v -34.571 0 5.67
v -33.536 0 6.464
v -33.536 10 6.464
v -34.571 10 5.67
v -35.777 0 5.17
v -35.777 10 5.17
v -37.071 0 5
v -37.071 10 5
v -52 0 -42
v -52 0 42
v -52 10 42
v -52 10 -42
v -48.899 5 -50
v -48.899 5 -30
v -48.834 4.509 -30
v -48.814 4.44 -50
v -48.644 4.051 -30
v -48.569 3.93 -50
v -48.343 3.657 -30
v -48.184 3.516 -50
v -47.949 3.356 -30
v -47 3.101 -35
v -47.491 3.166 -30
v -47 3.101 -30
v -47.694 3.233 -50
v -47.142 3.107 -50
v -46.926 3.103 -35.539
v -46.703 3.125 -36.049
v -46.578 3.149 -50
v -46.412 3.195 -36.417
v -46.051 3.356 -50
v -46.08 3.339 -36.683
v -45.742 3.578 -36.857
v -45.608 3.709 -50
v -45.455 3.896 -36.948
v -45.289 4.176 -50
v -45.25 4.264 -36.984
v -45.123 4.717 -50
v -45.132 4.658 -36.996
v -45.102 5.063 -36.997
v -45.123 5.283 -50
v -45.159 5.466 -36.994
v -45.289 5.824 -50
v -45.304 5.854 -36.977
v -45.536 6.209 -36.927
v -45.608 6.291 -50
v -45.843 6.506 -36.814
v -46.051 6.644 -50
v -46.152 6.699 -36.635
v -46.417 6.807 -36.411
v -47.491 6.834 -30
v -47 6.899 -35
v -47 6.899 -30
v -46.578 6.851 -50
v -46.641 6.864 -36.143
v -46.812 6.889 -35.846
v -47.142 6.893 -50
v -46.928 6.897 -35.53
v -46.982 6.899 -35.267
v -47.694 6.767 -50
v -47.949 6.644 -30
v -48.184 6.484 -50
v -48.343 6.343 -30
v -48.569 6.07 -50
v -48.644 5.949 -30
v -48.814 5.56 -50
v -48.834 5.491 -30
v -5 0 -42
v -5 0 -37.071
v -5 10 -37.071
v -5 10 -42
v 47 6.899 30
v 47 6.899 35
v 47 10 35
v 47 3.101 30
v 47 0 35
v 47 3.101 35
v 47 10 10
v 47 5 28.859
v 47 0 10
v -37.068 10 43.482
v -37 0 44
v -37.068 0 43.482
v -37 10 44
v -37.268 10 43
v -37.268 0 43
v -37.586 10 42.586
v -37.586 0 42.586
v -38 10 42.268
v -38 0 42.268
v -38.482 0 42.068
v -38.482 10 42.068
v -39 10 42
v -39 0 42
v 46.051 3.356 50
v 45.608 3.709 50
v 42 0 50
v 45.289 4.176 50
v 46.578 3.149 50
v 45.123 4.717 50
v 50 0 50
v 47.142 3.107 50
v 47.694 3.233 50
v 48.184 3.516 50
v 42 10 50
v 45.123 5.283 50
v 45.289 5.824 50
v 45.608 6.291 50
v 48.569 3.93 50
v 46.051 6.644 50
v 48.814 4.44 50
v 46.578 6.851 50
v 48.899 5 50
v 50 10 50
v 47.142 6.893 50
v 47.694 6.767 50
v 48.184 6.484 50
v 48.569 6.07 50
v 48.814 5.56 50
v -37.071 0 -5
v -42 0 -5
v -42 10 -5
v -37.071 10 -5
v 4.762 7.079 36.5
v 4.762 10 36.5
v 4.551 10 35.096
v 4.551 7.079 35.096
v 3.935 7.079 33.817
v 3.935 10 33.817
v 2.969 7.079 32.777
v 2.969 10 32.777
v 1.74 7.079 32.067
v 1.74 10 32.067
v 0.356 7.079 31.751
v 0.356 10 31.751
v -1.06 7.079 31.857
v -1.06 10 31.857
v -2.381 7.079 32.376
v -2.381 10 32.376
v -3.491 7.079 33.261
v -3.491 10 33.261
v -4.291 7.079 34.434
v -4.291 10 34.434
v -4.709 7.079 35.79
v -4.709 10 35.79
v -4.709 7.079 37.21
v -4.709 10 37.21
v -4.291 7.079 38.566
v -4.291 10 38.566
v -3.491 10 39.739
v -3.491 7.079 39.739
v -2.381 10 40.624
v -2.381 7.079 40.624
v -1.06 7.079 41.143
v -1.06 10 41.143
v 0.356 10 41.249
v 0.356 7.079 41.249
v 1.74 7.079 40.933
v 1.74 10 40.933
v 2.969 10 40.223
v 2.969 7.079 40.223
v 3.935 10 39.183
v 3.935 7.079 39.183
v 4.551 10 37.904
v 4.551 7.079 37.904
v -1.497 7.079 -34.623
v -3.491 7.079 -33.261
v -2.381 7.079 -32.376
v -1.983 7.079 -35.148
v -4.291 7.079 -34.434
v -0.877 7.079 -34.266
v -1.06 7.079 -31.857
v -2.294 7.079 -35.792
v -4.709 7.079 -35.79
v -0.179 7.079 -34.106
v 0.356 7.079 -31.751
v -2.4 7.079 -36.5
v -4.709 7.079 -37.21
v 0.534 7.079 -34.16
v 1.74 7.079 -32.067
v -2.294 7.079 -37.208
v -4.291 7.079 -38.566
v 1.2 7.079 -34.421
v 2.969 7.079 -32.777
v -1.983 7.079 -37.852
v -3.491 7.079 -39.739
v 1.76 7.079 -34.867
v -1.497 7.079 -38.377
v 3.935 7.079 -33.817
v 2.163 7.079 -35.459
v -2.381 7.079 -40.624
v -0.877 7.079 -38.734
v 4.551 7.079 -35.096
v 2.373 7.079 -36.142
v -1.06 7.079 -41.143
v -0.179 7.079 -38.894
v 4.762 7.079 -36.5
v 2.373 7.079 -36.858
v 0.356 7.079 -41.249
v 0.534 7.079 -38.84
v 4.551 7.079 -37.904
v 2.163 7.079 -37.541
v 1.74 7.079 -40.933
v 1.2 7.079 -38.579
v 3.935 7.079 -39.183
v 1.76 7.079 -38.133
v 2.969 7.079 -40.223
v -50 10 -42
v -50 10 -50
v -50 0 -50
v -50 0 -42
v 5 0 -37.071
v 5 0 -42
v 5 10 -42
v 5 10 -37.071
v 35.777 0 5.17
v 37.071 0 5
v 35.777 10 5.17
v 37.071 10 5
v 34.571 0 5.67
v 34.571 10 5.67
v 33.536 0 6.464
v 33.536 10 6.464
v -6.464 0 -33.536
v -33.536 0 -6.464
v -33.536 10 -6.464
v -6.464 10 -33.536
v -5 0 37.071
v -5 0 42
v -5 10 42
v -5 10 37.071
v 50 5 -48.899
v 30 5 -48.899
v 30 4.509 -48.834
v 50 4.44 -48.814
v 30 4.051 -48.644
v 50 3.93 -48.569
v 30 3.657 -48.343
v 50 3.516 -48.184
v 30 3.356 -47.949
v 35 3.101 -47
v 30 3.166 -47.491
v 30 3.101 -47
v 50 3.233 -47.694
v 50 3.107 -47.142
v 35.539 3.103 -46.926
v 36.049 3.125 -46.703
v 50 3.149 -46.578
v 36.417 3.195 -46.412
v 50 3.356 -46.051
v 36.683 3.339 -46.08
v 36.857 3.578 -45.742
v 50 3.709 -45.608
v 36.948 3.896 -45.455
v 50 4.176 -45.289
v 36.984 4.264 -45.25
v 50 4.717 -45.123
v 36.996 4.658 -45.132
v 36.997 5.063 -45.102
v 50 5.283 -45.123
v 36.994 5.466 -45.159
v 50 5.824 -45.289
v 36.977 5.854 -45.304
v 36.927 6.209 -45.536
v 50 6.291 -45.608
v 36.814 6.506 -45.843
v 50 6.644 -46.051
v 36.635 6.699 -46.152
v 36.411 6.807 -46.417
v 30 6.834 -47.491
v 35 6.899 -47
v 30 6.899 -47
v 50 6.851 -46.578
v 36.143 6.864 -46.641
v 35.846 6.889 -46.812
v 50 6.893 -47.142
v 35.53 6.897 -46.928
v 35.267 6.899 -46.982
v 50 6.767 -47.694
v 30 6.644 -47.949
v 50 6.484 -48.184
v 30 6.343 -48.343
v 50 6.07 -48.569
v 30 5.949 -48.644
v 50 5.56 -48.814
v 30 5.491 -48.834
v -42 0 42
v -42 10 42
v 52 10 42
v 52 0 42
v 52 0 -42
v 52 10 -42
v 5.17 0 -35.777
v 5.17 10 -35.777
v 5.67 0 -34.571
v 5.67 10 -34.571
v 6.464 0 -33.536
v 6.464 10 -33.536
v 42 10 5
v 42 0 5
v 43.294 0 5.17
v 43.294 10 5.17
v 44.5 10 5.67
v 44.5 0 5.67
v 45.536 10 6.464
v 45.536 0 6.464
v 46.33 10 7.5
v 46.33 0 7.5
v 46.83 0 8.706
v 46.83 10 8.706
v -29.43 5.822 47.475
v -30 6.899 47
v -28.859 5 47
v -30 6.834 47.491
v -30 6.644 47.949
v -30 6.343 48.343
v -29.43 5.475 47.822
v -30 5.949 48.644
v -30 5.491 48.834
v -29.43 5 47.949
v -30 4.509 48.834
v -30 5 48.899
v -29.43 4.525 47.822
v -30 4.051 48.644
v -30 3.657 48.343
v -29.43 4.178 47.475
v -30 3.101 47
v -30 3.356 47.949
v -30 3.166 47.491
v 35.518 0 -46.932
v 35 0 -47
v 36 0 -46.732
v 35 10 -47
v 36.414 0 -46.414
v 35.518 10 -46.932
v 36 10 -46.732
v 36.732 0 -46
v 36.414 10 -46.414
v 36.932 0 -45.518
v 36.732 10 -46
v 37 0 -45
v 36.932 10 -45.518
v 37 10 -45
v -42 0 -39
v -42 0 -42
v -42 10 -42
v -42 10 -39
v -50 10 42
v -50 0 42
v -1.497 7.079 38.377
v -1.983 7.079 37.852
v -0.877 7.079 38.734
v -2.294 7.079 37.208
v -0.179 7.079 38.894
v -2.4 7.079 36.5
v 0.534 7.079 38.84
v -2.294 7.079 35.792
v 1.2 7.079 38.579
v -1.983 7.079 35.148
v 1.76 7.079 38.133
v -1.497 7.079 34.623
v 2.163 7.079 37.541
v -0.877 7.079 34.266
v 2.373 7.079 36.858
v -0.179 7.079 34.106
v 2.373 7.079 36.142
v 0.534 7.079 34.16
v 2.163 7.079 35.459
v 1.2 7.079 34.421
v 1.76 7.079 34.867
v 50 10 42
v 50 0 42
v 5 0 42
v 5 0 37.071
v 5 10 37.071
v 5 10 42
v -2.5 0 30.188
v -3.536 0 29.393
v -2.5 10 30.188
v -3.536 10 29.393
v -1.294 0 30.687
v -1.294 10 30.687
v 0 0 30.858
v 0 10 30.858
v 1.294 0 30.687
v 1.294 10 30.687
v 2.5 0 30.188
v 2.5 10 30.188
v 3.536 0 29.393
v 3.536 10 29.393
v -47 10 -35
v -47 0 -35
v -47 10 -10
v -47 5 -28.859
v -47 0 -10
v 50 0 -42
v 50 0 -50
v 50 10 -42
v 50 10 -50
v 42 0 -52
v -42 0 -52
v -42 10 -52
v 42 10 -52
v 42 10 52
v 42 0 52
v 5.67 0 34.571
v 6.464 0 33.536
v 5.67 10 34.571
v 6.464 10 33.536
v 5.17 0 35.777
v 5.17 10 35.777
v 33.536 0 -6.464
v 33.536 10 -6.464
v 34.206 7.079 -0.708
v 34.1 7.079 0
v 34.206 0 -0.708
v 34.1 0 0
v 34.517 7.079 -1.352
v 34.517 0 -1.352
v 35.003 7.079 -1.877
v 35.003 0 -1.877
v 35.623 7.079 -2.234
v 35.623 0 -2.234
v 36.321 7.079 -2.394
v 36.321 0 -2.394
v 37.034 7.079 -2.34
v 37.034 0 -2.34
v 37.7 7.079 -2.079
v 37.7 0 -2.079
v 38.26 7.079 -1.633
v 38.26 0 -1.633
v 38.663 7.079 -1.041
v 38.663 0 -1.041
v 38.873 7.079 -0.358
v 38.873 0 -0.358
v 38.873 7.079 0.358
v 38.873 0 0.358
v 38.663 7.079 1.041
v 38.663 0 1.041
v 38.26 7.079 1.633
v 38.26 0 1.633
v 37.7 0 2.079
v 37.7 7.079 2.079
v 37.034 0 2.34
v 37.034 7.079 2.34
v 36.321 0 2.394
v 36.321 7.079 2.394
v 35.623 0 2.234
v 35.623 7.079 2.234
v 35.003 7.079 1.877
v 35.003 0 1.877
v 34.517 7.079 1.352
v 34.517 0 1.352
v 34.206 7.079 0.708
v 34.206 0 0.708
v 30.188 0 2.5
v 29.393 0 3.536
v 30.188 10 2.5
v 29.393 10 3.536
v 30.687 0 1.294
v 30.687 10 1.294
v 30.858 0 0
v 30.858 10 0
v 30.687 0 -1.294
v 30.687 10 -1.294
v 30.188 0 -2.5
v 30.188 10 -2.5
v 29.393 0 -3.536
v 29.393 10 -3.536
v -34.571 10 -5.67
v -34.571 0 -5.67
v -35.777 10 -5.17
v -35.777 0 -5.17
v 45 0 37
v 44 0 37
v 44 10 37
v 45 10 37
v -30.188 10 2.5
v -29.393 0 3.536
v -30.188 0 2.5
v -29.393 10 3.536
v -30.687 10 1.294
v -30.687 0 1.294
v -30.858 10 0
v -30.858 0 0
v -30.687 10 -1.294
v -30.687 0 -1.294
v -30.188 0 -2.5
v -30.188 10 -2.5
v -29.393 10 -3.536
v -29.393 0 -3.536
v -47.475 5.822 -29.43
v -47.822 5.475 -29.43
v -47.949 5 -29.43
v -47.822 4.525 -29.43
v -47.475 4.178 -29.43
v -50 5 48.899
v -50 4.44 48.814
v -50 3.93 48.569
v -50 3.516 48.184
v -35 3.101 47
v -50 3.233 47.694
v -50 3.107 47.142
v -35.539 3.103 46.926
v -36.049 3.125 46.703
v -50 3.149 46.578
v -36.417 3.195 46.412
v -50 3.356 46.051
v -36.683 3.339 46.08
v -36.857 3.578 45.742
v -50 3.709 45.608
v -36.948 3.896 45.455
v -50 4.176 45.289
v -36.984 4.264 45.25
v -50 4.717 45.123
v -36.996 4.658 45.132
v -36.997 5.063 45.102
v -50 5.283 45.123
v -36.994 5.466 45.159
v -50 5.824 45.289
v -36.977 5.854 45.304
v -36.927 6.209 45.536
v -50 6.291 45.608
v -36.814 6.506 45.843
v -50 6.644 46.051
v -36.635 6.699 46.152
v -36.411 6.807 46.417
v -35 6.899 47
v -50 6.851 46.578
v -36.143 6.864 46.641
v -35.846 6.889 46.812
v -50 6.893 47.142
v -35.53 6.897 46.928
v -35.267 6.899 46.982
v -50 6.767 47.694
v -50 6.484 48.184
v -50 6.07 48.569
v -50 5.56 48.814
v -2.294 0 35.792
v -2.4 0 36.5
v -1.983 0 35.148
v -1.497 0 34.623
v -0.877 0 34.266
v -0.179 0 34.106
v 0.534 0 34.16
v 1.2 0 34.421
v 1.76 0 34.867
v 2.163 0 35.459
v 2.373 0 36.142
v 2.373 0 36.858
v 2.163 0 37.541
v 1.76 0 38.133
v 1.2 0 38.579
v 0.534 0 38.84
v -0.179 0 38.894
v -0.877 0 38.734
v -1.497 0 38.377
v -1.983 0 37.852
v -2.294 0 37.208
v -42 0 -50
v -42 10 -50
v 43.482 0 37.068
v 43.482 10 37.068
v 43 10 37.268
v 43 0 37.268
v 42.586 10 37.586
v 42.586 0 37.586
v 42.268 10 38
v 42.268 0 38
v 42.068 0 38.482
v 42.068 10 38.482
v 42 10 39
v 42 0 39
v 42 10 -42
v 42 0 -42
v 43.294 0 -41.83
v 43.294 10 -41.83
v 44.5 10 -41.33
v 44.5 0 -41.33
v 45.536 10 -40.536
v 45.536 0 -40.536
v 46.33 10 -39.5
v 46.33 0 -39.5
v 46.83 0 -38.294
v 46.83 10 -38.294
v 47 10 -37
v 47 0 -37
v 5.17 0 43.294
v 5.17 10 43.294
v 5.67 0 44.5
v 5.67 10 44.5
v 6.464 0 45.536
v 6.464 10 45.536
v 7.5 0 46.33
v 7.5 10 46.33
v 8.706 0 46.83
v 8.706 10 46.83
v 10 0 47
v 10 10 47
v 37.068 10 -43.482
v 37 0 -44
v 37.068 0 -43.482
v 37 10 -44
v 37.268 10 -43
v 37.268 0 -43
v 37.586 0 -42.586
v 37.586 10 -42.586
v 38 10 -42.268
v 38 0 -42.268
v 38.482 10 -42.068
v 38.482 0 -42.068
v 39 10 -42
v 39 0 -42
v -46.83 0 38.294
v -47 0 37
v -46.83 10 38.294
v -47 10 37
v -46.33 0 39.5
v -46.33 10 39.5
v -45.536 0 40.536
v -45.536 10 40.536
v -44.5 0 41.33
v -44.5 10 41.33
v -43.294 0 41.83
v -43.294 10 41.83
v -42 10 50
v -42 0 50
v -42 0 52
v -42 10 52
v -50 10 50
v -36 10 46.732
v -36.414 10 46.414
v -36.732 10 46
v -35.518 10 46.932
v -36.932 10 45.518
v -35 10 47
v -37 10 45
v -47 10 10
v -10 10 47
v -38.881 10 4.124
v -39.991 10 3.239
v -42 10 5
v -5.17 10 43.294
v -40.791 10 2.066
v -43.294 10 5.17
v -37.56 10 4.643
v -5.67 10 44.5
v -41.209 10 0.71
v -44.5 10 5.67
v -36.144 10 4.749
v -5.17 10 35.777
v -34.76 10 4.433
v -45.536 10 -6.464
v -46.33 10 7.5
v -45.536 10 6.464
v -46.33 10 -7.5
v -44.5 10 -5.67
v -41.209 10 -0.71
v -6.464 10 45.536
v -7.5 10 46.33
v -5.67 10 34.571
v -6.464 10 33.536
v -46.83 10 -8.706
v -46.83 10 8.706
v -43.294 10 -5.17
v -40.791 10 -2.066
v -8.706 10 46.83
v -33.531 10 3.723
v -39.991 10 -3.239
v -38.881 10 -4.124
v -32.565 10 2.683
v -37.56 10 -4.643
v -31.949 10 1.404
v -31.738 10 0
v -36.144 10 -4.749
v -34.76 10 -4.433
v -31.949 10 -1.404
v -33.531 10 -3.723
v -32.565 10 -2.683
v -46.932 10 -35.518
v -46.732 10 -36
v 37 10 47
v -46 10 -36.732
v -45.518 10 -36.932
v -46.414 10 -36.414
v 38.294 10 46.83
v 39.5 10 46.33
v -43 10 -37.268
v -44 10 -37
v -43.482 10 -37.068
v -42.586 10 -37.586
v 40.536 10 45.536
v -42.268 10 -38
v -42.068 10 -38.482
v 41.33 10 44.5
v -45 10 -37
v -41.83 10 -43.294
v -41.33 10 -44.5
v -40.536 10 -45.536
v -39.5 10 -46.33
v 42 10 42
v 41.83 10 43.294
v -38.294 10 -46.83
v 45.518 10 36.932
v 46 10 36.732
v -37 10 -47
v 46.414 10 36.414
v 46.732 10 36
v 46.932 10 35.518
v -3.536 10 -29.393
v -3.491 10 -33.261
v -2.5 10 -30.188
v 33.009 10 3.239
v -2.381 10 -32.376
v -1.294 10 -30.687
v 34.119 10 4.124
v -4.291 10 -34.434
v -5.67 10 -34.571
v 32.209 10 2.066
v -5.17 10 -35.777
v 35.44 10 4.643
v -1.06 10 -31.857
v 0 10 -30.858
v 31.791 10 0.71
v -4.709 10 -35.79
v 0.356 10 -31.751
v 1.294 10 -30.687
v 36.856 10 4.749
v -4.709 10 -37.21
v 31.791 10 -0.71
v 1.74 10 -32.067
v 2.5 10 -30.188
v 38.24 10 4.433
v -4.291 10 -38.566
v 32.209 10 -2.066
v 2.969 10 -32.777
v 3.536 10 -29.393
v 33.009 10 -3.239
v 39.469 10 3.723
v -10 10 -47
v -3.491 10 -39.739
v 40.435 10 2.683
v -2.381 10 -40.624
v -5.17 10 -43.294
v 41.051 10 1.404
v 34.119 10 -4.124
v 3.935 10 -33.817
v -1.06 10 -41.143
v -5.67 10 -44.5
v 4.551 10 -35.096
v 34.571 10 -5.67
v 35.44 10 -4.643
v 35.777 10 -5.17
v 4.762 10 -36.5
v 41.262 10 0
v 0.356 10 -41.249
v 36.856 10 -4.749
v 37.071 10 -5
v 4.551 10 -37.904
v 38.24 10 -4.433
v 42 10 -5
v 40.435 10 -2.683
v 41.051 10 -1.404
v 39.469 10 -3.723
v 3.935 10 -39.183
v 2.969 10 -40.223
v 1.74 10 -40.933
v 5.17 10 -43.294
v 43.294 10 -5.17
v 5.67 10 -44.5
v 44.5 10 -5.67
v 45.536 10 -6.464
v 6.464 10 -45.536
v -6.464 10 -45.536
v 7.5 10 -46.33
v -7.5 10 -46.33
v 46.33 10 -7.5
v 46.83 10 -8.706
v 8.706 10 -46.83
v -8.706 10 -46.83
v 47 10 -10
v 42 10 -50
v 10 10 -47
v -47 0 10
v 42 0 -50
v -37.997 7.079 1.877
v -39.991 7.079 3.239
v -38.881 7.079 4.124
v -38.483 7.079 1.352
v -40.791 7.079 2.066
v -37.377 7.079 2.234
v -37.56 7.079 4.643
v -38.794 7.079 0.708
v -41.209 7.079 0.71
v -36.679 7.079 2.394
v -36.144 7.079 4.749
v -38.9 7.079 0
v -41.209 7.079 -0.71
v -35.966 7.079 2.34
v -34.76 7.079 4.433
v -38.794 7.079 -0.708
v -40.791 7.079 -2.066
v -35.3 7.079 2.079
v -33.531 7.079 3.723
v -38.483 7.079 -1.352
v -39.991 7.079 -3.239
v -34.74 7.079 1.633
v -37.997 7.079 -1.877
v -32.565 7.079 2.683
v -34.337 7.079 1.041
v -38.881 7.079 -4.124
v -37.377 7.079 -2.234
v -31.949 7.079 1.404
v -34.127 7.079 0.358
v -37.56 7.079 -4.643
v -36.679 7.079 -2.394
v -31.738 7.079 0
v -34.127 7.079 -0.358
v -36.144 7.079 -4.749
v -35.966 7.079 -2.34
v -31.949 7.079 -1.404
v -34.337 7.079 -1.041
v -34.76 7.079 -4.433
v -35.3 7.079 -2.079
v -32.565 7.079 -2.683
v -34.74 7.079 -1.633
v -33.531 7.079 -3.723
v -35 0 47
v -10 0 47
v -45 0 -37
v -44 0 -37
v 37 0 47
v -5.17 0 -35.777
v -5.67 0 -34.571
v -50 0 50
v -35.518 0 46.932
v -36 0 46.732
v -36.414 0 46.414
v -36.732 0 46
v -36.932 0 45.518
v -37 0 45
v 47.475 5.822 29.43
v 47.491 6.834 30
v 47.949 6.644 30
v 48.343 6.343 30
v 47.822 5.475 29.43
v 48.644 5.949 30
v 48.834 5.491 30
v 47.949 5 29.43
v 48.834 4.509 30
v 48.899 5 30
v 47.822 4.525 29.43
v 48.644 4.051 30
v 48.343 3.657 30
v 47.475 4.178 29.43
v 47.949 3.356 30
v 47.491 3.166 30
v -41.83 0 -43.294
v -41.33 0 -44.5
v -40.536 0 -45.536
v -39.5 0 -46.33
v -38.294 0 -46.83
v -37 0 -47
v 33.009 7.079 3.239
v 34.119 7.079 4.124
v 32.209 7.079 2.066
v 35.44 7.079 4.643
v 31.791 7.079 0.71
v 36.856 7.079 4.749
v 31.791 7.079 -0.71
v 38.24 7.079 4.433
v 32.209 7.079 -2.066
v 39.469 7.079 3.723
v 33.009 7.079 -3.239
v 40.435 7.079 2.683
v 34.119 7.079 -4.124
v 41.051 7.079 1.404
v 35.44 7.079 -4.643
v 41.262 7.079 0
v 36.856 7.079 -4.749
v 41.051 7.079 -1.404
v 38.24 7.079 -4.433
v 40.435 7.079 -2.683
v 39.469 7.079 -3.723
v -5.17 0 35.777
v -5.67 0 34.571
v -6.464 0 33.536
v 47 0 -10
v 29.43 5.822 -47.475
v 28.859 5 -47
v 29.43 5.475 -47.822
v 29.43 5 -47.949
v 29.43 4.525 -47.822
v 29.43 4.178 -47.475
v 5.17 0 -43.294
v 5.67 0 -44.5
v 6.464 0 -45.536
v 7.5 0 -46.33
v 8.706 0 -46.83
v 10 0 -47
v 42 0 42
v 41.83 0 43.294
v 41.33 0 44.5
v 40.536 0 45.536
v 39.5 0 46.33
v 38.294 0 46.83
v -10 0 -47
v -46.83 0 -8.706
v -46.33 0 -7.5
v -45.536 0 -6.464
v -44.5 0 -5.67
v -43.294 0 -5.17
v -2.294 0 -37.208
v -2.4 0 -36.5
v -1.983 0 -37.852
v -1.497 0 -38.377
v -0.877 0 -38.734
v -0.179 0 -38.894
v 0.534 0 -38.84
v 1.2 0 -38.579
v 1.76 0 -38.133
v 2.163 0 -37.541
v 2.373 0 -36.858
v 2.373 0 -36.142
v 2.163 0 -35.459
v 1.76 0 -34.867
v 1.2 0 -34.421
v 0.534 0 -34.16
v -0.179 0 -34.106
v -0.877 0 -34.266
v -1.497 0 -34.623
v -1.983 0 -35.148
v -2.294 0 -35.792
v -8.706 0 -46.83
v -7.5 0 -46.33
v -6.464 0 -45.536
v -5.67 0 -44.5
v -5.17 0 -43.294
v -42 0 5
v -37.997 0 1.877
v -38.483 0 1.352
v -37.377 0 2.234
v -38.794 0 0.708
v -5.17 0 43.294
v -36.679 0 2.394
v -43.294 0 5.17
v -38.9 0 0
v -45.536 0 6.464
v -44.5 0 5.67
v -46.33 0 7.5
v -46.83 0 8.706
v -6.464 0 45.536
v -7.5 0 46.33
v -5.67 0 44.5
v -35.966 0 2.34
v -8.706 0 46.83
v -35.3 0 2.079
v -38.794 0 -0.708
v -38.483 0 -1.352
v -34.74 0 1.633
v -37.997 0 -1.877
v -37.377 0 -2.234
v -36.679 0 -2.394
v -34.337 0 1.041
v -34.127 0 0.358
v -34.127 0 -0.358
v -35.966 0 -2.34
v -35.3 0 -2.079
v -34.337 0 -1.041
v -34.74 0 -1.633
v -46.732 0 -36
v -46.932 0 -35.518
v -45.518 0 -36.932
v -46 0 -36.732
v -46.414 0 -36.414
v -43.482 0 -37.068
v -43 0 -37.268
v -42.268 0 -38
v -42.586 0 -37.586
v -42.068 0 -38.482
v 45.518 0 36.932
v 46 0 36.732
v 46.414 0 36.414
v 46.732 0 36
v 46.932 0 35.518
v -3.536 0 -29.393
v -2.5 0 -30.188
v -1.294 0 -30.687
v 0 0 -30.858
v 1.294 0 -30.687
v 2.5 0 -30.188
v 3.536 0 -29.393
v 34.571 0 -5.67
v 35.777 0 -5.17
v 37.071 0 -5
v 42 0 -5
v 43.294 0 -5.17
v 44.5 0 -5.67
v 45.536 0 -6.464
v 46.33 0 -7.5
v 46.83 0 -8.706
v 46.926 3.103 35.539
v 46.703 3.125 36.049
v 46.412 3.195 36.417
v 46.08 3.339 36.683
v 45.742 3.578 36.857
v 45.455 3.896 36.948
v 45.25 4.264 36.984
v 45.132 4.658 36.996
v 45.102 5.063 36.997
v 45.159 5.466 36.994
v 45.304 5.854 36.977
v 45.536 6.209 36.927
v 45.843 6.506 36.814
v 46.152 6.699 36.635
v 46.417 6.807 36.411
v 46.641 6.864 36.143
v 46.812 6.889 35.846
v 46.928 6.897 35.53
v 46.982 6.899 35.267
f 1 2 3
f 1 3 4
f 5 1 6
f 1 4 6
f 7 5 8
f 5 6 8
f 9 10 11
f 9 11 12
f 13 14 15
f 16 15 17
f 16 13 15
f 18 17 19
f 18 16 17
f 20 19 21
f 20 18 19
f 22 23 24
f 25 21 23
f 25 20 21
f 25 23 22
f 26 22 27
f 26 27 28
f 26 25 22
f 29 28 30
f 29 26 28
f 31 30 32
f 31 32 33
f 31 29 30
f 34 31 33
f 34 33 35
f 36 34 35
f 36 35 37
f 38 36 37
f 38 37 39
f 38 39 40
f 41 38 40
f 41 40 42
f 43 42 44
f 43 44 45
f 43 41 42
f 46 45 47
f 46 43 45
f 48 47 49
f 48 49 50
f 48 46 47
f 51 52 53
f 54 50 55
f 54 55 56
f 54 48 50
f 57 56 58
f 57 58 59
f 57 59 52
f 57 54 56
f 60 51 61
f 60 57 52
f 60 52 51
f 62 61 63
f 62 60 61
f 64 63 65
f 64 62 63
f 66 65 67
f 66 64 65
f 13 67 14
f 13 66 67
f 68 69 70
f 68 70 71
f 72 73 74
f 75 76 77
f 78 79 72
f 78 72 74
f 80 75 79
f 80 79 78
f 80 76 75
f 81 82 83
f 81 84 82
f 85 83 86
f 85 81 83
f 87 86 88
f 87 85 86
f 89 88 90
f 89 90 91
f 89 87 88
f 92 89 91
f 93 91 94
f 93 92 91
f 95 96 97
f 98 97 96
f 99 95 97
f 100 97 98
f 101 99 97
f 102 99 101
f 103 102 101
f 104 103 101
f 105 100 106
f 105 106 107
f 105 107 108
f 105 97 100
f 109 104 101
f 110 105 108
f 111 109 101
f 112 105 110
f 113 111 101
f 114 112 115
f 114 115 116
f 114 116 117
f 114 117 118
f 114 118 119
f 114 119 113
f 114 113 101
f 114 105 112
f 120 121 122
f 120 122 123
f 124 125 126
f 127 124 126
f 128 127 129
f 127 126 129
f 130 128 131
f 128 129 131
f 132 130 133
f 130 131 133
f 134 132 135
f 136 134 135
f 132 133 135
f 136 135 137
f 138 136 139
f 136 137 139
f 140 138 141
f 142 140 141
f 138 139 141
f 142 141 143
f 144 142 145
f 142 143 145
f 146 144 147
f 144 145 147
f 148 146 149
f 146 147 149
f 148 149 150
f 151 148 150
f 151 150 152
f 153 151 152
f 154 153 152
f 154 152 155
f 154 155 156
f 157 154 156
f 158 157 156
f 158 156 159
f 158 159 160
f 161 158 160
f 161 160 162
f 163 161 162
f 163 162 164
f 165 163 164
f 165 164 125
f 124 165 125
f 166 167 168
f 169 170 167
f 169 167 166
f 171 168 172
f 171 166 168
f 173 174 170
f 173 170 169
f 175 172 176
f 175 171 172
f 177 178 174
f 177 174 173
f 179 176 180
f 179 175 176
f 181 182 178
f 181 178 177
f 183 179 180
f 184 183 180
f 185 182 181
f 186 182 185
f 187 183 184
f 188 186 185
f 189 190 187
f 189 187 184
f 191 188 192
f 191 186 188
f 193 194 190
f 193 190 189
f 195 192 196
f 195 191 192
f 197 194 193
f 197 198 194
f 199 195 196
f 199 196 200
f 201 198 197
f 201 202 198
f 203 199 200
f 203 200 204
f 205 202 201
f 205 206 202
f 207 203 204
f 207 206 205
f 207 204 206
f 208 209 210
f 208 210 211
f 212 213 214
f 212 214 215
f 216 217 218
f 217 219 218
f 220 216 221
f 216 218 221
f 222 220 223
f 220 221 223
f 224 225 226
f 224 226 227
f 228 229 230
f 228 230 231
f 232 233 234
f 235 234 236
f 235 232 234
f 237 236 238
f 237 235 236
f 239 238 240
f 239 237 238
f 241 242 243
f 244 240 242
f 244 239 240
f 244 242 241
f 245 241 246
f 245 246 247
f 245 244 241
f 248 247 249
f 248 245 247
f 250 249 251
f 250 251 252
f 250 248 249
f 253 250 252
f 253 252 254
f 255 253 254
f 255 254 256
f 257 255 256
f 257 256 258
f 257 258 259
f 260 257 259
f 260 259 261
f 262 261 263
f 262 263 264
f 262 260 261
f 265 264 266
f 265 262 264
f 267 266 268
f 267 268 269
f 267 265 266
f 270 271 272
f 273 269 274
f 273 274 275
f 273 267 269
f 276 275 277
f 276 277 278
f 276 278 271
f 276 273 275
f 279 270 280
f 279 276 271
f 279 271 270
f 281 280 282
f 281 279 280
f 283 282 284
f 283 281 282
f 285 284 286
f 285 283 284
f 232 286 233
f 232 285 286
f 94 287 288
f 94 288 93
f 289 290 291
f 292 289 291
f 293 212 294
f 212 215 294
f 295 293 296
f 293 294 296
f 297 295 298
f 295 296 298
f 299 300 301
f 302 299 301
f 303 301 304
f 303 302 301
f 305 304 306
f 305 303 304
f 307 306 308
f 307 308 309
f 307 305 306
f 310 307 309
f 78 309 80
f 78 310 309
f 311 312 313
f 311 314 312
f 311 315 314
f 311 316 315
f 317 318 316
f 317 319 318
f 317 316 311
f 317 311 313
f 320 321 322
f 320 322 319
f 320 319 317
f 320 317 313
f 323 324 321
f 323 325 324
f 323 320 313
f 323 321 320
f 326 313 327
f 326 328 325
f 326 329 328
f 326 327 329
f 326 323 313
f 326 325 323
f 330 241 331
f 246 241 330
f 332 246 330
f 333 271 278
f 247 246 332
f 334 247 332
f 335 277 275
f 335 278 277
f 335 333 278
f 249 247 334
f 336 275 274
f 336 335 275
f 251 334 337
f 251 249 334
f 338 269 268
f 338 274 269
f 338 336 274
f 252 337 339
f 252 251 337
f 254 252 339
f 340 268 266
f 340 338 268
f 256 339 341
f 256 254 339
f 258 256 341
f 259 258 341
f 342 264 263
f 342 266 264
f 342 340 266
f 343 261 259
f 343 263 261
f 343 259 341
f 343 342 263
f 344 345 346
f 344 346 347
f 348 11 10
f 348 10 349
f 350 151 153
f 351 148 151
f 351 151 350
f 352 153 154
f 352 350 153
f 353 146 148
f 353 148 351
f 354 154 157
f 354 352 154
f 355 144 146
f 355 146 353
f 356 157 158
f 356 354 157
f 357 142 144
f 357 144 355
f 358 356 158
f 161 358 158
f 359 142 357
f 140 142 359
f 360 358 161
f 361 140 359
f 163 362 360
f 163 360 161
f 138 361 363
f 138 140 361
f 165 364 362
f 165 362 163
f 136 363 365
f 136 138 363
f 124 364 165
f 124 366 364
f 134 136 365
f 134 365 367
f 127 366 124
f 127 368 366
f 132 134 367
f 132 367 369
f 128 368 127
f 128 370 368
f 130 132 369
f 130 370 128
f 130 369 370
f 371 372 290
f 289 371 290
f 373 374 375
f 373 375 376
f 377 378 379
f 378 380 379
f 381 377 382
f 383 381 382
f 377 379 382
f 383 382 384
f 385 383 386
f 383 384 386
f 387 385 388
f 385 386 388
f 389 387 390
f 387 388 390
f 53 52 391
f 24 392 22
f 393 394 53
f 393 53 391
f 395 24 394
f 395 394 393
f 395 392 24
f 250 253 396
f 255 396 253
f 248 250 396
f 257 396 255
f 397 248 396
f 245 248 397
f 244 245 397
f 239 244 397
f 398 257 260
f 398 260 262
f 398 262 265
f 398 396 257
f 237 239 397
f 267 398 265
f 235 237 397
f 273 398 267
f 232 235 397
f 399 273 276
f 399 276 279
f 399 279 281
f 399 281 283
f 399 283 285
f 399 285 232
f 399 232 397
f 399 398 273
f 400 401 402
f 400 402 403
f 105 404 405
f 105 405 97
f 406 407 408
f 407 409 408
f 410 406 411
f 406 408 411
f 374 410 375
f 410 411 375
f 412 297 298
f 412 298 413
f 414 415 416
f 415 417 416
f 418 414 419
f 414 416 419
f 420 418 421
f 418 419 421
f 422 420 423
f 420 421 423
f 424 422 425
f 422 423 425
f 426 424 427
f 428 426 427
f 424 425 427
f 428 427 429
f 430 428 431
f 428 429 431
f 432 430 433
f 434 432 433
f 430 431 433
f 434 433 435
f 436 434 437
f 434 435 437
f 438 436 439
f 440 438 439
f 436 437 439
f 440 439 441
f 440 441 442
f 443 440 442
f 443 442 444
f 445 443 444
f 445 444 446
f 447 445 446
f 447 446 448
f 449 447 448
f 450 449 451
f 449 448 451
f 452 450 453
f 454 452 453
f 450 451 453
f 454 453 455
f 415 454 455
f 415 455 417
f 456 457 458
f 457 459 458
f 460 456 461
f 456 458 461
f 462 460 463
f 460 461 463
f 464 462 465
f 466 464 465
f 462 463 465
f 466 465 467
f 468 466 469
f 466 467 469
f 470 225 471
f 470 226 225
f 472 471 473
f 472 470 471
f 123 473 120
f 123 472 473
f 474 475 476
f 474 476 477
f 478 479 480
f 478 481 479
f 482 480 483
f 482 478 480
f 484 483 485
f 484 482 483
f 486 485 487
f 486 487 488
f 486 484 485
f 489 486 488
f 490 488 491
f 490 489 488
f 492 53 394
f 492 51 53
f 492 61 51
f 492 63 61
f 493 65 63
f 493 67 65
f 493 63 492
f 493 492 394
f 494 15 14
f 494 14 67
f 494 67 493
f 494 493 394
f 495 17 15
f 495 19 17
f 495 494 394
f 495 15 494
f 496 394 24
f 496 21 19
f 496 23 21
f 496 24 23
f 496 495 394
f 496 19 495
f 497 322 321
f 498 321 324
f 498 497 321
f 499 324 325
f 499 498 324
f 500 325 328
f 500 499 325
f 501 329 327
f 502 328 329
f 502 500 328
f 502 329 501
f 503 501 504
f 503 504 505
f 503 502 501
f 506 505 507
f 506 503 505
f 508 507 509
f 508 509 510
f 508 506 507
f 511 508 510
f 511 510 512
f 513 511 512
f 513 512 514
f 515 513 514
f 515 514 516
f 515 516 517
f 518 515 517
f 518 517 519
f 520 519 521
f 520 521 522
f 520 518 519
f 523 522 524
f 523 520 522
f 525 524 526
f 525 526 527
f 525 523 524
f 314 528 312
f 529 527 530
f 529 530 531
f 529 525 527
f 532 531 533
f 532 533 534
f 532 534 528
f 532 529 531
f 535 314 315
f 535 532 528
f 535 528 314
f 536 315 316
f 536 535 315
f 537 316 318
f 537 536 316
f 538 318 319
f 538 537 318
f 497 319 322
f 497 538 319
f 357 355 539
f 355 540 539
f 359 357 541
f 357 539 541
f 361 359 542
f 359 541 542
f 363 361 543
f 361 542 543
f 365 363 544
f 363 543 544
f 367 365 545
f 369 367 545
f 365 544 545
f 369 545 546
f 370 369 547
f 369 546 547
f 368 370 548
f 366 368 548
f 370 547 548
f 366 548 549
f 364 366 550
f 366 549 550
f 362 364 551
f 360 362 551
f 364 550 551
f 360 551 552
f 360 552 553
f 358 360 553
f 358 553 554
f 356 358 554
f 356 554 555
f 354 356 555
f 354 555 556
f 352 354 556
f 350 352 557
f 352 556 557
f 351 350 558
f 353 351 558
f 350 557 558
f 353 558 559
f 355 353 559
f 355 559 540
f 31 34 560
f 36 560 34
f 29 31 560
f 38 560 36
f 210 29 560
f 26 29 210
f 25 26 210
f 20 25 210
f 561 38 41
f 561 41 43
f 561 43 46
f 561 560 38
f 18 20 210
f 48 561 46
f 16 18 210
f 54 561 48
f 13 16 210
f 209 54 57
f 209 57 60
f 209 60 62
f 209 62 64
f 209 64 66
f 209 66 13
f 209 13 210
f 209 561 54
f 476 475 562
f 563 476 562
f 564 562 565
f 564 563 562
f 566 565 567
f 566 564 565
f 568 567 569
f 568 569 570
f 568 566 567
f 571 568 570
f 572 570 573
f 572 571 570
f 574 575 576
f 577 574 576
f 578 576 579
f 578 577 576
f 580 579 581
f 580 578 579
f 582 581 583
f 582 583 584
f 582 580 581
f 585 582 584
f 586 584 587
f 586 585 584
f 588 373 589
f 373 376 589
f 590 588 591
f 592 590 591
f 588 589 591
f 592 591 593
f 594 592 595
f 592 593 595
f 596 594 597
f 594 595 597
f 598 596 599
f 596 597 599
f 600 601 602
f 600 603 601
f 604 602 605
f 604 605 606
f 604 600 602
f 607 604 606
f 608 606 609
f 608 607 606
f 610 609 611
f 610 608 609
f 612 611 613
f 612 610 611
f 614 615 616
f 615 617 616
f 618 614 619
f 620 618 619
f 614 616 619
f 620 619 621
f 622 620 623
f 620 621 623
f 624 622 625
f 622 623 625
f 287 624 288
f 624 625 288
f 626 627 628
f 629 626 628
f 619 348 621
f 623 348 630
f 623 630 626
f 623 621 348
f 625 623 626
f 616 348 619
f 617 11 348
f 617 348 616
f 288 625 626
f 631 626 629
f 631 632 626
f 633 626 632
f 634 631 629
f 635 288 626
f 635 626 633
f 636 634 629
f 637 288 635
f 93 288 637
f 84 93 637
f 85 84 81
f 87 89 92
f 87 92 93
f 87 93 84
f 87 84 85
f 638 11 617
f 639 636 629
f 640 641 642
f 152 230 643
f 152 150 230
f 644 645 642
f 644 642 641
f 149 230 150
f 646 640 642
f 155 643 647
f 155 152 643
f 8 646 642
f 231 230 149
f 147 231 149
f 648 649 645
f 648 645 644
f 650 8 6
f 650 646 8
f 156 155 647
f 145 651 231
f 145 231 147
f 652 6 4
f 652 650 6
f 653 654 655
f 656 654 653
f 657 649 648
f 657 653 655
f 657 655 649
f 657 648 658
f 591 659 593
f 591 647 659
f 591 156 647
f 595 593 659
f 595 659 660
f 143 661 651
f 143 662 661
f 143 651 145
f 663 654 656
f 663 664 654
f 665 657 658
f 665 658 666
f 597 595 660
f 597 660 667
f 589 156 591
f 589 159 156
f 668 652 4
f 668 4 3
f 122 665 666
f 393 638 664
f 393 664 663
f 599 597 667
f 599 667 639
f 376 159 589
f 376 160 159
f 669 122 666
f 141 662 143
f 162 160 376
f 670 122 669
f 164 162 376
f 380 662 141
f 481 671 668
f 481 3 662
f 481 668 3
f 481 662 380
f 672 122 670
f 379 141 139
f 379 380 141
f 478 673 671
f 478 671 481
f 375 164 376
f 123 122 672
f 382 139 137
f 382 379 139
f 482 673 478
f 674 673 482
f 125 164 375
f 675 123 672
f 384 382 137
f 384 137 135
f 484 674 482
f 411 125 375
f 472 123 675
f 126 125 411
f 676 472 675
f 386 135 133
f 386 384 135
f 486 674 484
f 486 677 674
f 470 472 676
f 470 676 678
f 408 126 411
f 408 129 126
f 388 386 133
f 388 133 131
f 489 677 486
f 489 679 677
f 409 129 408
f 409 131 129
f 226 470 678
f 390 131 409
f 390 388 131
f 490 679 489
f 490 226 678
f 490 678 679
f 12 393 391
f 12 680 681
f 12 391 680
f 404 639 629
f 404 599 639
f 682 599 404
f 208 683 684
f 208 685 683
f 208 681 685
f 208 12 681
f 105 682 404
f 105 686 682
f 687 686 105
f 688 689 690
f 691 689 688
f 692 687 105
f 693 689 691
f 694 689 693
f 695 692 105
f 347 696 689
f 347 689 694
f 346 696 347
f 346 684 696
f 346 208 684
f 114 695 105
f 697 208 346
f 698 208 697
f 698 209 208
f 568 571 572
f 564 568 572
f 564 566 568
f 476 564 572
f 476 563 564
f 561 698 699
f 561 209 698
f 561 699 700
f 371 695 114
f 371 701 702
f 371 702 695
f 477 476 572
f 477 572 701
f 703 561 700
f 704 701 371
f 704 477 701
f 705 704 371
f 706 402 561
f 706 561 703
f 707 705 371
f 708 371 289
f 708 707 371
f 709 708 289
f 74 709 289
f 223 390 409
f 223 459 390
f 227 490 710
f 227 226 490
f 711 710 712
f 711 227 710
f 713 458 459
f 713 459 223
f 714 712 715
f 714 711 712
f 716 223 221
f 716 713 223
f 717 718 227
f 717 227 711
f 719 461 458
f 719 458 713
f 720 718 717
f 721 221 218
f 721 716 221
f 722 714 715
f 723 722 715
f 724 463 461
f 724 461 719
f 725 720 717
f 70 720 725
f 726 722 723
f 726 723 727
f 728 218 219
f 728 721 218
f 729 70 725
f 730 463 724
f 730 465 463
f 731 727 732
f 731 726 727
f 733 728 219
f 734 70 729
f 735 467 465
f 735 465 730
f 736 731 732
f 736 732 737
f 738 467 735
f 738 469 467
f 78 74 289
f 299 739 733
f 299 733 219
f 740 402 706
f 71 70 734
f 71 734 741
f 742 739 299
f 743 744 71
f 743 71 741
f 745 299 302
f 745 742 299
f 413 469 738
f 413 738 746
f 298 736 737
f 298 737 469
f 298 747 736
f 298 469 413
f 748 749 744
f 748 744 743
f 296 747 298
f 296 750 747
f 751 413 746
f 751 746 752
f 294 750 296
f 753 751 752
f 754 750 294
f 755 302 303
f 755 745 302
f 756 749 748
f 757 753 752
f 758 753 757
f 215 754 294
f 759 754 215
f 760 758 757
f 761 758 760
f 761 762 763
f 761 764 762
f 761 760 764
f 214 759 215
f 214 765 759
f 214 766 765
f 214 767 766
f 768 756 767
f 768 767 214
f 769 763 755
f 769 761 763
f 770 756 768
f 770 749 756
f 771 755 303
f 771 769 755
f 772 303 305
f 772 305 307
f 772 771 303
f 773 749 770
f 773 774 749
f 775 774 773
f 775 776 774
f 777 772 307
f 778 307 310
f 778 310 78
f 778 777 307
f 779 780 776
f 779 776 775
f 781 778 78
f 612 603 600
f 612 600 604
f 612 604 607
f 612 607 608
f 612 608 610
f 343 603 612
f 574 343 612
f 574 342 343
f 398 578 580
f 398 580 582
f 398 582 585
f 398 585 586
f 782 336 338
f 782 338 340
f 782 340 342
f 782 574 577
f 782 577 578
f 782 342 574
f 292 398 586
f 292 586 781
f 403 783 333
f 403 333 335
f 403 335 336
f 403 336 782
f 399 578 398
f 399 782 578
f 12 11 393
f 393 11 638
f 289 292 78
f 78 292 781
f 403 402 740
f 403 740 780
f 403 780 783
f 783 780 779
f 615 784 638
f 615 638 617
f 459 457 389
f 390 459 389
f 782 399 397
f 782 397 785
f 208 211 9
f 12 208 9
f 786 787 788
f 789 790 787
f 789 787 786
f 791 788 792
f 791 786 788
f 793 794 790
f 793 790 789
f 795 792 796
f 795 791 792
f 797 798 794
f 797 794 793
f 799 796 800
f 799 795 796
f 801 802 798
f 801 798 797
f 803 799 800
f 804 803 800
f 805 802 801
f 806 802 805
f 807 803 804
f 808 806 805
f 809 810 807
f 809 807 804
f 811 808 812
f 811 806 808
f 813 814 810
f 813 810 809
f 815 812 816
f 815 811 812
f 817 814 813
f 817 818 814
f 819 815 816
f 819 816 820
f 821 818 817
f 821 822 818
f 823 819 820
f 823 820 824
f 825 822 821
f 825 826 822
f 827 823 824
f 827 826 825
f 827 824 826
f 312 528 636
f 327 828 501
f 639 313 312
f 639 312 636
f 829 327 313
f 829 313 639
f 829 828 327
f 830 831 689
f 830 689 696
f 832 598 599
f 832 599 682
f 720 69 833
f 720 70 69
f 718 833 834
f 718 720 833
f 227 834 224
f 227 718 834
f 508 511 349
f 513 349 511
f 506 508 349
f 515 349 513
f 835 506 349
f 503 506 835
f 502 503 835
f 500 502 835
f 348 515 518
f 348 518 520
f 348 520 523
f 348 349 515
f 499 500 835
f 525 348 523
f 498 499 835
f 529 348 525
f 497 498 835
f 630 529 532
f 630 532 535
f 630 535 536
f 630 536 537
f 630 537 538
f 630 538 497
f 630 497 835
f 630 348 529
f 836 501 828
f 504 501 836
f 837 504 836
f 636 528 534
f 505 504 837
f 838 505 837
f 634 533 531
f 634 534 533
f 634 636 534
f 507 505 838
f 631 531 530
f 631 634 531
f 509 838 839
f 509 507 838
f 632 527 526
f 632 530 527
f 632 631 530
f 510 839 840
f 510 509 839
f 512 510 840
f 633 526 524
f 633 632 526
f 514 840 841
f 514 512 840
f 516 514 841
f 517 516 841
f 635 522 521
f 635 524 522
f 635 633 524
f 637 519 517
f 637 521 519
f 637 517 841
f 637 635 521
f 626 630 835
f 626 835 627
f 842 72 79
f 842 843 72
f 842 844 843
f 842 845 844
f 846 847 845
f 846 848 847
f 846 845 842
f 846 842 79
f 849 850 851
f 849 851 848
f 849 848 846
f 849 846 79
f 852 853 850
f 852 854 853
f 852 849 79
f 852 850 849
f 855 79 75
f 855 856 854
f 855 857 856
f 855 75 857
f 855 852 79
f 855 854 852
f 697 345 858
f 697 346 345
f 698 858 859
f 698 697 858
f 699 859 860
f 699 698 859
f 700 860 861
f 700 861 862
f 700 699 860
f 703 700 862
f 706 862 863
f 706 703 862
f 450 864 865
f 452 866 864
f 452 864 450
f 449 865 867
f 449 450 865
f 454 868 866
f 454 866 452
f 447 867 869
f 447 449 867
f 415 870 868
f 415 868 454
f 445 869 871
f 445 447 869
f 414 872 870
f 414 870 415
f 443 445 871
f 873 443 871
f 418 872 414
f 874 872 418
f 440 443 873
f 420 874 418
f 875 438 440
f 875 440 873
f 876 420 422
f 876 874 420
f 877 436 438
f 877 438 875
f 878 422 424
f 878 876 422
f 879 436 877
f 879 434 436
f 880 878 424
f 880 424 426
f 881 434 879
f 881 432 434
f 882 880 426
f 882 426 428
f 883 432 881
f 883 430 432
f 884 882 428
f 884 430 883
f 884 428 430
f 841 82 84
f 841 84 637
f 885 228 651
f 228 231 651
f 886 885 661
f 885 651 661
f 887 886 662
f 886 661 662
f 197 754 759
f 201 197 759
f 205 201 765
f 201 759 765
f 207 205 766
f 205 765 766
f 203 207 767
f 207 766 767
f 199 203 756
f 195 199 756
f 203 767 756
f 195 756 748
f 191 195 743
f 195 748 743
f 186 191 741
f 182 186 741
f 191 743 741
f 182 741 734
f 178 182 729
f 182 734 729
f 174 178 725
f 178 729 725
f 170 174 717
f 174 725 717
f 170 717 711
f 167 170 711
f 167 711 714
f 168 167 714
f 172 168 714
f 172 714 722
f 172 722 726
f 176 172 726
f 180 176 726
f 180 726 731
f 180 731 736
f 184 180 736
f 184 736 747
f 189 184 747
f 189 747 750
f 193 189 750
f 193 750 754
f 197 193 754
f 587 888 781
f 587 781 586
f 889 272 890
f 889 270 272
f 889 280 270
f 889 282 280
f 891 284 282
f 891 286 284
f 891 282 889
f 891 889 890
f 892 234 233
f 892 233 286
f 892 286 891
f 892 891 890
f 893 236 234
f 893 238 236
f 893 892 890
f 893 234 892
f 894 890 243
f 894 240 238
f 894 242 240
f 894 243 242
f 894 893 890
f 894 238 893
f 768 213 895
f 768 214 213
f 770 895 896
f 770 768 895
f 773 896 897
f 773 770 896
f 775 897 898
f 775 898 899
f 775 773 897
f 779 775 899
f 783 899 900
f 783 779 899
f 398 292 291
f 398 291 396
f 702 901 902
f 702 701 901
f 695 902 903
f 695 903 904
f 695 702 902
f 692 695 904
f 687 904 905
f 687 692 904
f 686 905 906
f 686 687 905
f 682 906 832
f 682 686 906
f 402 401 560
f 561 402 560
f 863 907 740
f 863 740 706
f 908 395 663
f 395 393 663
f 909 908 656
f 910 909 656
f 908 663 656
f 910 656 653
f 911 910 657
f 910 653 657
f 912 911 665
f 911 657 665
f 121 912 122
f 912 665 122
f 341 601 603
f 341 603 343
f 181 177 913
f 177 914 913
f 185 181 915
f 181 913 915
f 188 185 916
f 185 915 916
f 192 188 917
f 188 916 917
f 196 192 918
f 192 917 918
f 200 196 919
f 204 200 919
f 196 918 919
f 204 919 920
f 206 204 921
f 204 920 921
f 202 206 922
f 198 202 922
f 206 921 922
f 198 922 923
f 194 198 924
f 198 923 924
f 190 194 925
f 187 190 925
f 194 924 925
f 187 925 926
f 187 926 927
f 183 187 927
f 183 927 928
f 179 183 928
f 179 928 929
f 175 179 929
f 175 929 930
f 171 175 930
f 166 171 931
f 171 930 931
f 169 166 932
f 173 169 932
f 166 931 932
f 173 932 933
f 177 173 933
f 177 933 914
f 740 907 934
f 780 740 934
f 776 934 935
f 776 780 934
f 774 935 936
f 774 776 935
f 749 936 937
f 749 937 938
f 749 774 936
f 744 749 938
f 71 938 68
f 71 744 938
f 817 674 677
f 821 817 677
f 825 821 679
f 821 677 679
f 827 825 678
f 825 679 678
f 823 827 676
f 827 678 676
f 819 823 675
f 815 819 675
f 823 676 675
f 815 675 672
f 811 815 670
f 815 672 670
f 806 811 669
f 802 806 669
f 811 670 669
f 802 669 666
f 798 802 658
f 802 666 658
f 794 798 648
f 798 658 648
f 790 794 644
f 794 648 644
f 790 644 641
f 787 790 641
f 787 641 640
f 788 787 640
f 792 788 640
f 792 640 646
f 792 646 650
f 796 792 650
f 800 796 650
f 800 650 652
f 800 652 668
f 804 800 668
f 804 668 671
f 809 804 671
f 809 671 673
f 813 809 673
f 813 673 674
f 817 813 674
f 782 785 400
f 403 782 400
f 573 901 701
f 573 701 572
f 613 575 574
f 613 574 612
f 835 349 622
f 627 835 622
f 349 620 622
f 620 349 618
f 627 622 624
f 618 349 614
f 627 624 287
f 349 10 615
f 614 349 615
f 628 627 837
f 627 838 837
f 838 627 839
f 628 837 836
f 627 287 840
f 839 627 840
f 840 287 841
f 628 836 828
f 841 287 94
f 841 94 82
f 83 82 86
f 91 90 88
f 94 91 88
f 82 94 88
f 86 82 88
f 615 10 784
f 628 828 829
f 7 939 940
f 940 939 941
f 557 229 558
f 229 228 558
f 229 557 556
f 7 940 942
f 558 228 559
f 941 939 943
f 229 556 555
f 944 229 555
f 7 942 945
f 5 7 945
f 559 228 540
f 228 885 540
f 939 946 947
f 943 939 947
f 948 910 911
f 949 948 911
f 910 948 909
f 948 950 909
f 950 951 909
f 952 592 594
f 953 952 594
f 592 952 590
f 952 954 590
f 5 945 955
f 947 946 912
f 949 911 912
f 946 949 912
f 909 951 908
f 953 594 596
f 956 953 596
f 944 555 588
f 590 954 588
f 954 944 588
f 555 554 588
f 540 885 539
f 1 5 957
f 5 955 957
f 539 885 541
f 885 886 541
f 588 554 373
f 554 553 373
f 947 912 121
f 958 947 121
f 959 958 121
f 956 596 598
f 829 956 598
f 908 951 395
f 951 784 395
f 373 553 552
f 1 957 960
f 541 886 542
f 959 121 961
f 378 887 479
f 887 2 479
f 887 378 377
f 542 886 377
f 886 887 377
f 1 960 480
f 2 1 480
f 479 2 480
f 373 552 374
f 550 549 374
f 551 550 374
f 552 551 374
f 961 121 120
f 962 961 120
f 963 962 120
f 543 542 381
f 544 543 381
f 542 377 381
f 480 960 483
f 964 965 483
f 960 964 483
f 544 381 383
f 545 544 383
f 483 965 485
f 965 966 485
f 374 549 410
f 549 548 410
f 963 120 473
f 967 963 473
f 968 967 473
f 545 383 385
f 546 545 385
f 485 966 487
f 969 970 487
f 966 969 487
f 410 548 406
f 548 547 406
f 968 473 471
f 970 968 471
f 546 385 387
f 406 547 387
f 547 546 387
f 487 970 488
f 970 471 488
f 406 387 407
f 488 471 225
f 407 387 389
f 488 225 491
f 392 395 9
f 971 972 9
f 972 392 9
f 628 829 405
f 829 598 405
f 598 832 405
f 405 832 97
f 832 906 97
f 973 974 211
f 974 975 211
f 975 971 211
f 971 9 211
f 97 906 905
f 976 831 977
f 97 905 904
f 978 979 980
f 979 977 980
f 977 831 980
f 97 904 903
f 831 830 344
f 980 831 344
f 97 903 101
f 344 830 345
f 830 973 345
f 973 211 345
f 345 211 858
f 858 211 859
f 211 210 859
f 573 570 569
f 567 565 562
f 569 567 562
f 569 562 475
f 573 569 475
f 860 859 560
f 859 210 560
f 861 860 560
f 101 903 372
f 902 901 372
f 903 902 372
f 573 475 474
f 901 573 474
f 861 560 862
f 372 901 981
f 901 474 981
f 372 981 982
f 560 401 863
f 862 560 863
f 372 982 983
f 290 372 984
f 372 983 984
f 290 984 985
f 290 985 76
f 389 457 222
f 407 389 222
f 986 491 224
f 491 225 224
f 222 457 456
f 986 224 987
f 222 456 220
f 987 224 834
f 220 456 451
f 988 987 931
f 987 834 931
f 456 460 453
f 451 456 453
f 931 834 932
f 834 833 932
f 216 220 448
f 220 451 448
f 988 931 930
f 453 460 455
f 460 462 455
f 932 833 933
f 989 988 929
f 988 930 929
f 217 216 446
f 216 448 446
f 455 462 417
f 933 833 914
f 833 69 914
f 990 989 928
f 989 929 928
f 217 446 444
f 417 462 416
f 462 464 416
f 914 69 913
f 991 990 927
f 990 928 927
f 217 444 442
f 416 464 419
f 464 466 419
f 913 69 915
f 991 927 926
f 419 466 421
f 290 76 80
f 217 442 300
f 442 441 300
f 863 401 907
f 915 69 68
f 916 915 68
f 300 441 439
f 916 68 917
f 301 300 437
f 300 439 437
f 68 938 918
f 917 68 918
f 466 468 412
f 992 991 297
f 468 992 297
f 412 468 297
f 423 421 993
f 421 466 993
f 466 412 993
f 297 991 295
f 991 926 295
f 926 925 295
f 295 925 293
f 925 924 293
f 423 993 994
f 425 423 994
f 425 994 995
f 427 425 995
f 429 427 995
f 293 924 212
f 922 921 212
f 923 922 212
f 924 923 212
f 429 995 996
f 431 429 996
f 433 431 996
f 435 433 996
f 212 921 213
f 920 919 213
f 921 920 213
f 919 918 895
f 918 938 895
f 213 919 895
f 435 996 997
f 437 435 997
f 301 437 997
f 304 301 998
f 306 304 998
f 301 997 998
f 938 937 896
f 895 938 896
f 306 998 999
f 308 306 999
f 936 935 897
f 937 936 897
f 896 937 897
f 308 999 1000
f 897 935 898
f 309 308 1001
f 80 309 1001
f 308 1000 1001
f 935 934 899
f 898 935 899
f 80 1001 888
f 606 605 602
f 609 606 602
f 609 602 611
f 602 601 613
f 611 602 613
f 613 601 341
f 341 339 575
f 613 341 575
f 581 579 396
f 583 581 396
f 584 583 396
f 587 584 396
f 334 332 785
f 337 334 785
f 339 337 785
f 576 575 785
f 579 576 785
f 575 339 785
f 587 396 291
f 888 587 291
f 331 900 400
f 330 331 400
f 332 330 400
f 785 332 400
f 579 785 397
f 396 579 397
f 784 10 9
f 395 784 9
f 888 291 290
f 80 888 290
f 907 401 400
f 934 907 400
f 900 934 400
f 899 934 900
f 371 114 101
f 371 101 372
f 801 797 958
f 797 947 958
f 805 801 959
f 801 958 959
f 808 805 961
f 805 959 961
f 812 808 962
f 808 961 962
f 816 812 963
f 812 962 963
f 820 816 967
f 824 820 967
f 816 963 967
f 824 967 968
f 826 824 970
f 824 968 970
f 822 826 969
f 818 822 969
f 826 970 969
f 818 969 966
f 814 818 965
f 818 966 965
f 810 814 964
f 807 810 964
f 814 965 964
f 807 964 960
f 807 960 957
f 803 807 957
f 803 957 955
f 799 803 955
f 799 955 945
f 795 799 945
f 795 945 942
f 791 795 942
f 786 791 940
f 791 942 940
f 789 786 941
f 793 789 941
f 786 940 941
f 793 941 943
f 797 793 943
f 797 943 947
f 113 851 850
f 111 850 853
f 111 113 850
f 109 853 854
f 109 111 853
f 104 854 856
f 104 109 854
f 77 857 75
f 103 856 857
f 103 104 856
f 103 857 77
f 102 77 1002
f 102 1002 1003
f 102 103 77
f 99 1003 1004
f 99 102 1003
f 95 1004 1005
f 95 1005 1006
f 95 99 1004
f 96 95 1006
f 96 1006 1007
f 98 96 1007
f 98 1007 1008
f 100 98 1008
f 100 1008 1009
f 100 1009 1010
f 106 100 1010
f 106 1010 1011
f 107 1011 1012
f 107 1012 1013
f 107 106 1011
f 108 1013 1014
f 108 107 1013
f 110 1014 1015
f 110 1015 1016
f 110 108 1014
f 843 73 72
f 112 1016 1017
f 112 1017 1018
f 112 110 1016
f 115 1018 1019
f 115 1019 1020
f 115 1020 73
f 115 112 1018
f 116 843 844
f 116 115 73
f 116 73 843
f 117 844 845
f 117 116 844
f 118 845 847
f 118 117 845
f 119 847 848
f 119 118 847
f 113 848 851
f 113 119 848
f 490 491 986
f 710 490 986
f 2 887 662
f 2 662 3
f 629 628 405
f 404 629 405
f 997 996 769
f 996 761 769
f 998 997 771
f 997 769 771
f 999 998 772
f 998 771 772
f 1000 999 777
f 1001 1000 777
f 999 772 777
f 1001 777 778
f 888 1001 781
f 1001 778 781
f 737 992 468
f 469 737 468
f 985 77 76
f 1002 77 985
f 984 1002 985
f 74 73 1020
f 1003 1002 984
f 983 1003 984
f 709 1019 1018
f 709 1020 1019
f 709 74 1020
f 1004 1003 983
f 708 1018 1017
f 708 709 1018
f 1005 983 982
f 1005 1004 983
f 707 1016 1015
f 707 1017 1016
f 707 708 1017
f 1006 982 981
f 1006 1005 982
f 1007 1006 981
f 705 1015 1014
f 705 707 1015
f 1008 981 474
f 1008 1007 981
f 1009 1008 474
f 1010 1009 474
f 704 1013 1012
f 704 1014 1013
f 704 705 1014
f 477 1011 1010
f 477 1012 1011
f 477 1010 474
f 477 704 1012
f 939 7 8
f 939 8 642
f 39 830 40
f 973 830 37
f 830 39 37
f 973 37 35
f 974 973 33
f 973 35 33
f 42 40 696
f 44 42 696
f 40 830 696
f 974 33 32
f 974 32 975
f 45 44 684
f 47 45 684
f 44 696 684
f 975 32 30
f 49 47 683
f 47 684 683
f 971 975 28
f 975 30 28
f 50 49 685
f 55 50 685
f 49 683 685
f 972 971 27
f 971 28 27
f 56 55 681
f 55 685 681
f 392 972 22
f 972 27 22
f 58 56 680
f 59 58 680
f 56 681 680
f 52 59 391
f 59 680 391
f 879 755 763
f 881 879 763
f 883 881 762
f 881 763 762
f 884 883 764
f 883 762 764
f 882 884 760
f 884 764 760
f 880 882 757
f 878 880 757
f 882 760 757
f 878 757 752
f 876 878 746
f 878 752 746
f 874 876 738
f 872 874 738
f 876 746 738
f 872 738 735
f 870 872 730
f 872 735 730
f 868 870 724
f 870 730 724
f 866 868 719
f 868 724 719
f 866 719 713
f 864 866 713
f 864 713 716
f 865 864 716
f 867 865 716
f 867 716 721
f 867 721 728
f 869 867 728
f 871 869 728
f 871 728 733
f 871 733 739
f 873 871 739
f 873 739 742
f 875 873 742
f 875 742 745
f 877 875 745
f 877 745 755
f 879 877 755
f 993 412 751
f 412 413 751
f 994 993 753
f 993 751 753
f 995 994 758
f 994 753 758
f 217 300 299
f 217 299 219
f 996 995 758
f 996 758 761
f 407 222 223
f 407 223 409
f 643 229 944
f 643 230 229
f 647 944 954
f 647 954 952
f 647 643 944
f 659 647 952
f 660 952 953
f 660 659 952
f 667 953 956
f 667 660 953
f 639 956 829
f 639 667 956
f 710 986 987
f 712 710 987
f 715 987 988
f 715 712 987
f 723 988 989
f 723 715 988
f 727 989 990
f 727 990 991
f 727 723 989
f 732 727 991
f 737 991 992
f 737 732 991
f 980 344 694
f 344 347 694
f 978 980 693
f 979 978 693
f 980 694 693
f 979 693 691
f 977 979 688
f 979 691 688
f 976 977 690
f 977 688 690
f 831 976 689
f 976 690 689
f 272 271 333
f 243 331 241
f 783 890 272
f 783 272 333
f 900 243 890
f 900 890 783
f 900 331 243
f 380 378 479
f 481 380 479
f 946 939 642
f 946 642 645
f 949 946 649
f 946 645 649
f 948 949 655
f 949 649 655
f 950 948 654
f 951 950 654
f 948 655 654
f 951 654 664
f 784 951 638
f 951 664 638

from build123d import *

# Parameters (mm, degrees)
SKETCH1_W                                           = 104
SKETCH1_H                                           = 104
BOSS_EXTRUDE1_DEPTH                                 = 10
FILLET1_R                                           = 5
CUT_EXTRUDE1_DEPTH                                  = 11
CIRPATTERN1_COUNT                                   = 4
CBORE_FOR_12_BINDING_HEAD_MACHINE_SCREW_D           = 4.8006
CBORE_FOR_12_BINDING_HEAD_MACHINE_SCREW_CBORE_D     = 9.525
CBORE_FOR_12_BINDING_HEAD_MACHINE_SCREW_CBORE_DEPTH = 2.921
FILLET3_R                                           = 2
CIRPATTERN5_COUNT                                   = 4


with BuildPart() as part:
    # Sketch1 → Boss-Extrude1 (new body)
    with BuildSketch(Plane(origin=(0, 0, 0), x_dir=(1, 0, 0), z_dir=(0, 1, 0))):
        Rectangle(SKETCH1_W, SKETCH1_H)
        Polygon((-42, 47), (-42, 37), (-47, 37), (-47, 5), (-35, 5), (-5, 35), (-5, 47), align=None, mode=Mode.SUBTRACT)
        Polygon((-32.928932188, 0), (0, 32.928932188), (32.928932188, 0), (0, -32.928932188), align=None, mode=Mode.SUBTRACT)
        Polygon((5, 47), (5, 35), (35, 5), (47, 5), (47, 42), (37, 42), (37, 47), align=None, mode=Mode.SUBTRACT)
        Polygon((47, -5), (35, -5), (5, -35), (5, -47), (42, -47), (42, -37), (47, -37), align=None, mode=Mode.SUBTRACT)
        Polygon((-5, -47), (-5, -35), (-35, -5), (-47, -5), (-47, -42), (-37, -42), (-37, -47), align=None, mode=Mode.SUBTRACT)
    extrude(amount=BOSS_EXTRUDE1_DEPTH)

    # Fillet1
    fillet1_edges = [part.edges().sort_by_distance(p)[0] for p in [
        (-5, 5, -35),
        (-5, 5, -47),
        (-42, 5, -47),
        (-47, 5, -5),
        (-35, 5, -5),
        (-32.928932188, 5, 0),
        (0, 5, 32.928932188),
        (32.928932188, 5, 0),
        (0, 5, -32.928932188),
        (5, 5, -35),
        (35, 5, -5),
        (47, 5, -5),
        (47, 5, -42),
        (5, 5, -47),
        (35, 5, 5),
        (5, 5, 35),
        (5, 5, 47),
        (42, 5, 47),
        (47, 5, 5),
        (-5, 5, 35),
        (-35, 5, 5),
        (-47, 5, 5),
        (-47, 5, 42),
        (-5, 5, 47),
    ]]
    fillet(fillet1_edges, radius=FILLET1_R)

    # Sketch2 → Cut-Extrude1 (cut, through all)
    with BuildSketch(Plane(origin=(0, 10, 0), x_dir=(1, 0, 0), z_dir=(0, 1, 0))):
        Polygon((-52, 52), (-42, 52), (-42, 50), (-50, 50), (-50, 42), (-52, 42), align=None)
    cut_extrude1 = extrude(amount=-CUT_EXTRUDE1_DEPTH, mode=Mode.SUBTRACT)

    # CirPattern1: Cut-Extrude1 ×4 about axis
    cirpattern1_axis = Axis((0, 0, 0), (0, 1, 0))
    for i in range(1, CIRPATTERN1_COUNT):
        add(cut_extrude1.rotate(cirpattern1_axis, i * 360 / CIRPATTERN1_COUNT), mode=Mode.SUBTRACT)

    # CBORE for #12 Binding Head Machine Screw1 (through all)
    with Locations(Plane(origin=(0, 10, 0), x_dir=(1, 0, 0), z_dir=(0, 1, 0))):
        with Locations((0, 36.5), (-36.5, 0), (0, -36.5), (36.5, 0)):
            CounterBoreHole(CBORE_FOR_12_BINDING_HEAD_MACHINE_SCREW_D / 2, CBORE_FOR_12_BINDING_HEAD_MACHINE_SCREW_CBORE_D / 2, CBORE_FOR_12_BINDING_HEAD_MACHINE_SCREW_CBORE_DEPTH)

    # Fillet3
    fillet3_edges = [part.edges().sort_by_distance(p)[0] for p in [
        (-42, 5, -37),
        (-47, 5, -37),
        (37, 5, -42),
        (37, 5, -47),
        (42, 5, 37),
        (47, 5, 37),
        (-37, 5, 42),
        (-37, 5, 47),
    ]]
    fillet(fillet3_edges, radius=FILLET3_R)

    # Sketch9 → #10-24 Tapped Hole1 (revolve, cut)
    with BuildSketch(Plane(origin=(50, 5, -47), x_dir=(0, 0, -1), z_dir=(0, 1, 0))):
        Polygon((0, 0), (0, 21.140824014), (1.89865, 20), (1.89865, 0), align=None)
    f_10_24_tapped_hole1 = revolve(axis=Axis((56.35, 5, -47), (-1, 0, 0)), mode=Mode.SUBTRACT)

    # CirPattern5: #10-24 Tapped Hole1 ×4 about axis
    cirpattern5_axis = Axis((0, 10.5, 0), (0, -1, 0))
    for i in range(1, CIRPATTERN5_COUNT):
        add(f_10_24_tapped_hole1.rotate(cirpattern5_axis, i * 360 / CIRPATTERN5_COUNT), mode=Mode.SUBTRACT)


solid = part.part
